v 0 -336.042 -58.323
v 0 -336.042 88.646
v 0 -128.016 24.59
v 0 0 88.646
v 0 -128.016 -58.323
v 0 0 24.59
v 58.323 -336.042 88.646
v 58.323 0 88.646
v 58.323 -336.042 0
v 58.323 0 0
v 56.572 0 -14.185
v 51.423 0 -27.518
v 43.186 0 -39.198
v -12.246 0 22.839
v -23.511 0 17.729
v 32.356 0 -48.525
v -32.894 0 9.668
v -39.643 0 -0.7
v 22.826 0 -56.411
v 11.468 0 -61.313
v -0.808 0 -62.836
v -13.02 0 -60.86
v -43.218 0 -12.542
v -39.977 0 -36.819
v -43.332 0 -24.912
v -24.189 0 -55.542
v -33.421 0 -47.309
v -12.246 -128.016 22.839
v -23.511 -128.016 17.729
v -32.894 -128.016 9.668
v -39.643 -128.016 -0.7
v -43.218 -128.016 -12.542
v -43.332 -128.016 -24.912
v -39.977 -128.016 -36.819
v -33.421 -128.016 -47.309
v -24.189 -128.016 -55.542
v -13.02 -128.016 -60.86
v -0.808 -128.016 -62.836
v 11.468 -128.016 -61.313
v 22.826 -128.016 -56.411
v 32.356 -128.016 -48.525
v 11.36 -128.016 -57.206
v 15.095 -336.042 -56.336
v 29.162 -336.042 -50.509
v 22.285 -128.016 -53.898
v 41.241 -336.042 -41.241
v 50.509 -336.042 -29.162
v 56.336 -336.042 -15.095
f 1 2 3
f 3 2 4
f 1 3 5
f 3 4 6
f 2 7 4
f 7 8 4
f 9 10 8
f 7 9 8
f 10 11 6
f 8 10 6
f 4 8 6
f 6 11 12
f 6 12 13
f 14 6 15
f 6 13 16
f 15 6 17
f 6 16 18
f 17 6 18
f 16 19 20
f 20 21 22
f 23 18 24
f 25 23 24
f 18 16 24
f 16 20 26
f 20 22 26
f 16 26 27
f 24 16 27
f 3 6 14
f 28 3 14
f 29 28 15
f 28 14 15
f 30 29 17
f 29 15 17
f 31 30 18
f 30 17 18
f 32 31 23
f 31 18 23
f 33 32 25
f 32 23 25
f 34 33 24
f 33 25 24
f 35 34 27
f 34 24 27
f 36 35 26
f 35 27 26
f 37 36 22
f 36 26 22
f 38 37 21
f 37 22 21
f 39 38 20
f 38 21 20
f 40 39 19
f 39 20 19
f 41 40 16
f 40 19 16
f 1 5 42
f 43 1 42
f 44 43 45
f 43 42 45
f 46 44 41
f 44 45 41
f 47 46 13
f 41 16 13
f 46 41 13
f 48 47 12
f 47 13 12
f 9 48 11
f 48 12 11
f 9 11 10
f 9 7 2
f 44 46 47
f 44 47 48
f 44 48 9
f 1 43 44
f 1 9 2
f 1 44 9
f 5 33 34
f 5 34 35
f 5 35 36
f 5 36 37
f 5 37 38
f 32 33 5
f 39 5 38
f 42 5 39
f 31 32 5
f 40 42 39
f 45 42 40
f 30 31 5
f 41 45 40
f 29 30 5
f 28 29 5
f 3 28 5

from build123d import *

# Parameters (mm, degrees)
F2_DEPTH = 25.4
F3_DEPTH = 88.646
F4_DEPTH = 310.642
F1_R     = 43.7167010522
F5_DEPTH = 128.016


with BuildPart() as f2:
    # F0 (on Front) → F2 (new body)
    with BuildSketch(Plane.XZ):
        with BuildLine():
            Line((58.3230019719, 0), (0, 0))
            Line((0, 0), (0, -58.3230019719))
            ThreePointArc((0, -58.3230019719), (41.2405901935, -41.2405901935), (58.3230019719, 0))
        make_face()
    extrude(amount=F2_DEPTH)

    # F3 (add): a face of the model
    f3_faces = [f2.faces().sort_by_distance(p)[0] for p in [
        (29.1615009859, -12.7, 0),
    ]]
    extrude(f3_faces, amount=F3_DEPTH)

    # F4 (add): a face of the model
    f4_faces = [f2.faces().sort_by_distance(p)[0] for p in [
        (27.6595840852, -25.4, 20.7894486582),
    ]]
    extrude(f4_faces, amount=F4_DEPTH)

    # F1 (on Front) → F5 (join)
    with BuildSketch(Plane.XZ):
        with Locations((0, -19.1270262003)):
            Circle(F1_R)
    extrude(amount=F5_DEPTH)


solid = f2.part
